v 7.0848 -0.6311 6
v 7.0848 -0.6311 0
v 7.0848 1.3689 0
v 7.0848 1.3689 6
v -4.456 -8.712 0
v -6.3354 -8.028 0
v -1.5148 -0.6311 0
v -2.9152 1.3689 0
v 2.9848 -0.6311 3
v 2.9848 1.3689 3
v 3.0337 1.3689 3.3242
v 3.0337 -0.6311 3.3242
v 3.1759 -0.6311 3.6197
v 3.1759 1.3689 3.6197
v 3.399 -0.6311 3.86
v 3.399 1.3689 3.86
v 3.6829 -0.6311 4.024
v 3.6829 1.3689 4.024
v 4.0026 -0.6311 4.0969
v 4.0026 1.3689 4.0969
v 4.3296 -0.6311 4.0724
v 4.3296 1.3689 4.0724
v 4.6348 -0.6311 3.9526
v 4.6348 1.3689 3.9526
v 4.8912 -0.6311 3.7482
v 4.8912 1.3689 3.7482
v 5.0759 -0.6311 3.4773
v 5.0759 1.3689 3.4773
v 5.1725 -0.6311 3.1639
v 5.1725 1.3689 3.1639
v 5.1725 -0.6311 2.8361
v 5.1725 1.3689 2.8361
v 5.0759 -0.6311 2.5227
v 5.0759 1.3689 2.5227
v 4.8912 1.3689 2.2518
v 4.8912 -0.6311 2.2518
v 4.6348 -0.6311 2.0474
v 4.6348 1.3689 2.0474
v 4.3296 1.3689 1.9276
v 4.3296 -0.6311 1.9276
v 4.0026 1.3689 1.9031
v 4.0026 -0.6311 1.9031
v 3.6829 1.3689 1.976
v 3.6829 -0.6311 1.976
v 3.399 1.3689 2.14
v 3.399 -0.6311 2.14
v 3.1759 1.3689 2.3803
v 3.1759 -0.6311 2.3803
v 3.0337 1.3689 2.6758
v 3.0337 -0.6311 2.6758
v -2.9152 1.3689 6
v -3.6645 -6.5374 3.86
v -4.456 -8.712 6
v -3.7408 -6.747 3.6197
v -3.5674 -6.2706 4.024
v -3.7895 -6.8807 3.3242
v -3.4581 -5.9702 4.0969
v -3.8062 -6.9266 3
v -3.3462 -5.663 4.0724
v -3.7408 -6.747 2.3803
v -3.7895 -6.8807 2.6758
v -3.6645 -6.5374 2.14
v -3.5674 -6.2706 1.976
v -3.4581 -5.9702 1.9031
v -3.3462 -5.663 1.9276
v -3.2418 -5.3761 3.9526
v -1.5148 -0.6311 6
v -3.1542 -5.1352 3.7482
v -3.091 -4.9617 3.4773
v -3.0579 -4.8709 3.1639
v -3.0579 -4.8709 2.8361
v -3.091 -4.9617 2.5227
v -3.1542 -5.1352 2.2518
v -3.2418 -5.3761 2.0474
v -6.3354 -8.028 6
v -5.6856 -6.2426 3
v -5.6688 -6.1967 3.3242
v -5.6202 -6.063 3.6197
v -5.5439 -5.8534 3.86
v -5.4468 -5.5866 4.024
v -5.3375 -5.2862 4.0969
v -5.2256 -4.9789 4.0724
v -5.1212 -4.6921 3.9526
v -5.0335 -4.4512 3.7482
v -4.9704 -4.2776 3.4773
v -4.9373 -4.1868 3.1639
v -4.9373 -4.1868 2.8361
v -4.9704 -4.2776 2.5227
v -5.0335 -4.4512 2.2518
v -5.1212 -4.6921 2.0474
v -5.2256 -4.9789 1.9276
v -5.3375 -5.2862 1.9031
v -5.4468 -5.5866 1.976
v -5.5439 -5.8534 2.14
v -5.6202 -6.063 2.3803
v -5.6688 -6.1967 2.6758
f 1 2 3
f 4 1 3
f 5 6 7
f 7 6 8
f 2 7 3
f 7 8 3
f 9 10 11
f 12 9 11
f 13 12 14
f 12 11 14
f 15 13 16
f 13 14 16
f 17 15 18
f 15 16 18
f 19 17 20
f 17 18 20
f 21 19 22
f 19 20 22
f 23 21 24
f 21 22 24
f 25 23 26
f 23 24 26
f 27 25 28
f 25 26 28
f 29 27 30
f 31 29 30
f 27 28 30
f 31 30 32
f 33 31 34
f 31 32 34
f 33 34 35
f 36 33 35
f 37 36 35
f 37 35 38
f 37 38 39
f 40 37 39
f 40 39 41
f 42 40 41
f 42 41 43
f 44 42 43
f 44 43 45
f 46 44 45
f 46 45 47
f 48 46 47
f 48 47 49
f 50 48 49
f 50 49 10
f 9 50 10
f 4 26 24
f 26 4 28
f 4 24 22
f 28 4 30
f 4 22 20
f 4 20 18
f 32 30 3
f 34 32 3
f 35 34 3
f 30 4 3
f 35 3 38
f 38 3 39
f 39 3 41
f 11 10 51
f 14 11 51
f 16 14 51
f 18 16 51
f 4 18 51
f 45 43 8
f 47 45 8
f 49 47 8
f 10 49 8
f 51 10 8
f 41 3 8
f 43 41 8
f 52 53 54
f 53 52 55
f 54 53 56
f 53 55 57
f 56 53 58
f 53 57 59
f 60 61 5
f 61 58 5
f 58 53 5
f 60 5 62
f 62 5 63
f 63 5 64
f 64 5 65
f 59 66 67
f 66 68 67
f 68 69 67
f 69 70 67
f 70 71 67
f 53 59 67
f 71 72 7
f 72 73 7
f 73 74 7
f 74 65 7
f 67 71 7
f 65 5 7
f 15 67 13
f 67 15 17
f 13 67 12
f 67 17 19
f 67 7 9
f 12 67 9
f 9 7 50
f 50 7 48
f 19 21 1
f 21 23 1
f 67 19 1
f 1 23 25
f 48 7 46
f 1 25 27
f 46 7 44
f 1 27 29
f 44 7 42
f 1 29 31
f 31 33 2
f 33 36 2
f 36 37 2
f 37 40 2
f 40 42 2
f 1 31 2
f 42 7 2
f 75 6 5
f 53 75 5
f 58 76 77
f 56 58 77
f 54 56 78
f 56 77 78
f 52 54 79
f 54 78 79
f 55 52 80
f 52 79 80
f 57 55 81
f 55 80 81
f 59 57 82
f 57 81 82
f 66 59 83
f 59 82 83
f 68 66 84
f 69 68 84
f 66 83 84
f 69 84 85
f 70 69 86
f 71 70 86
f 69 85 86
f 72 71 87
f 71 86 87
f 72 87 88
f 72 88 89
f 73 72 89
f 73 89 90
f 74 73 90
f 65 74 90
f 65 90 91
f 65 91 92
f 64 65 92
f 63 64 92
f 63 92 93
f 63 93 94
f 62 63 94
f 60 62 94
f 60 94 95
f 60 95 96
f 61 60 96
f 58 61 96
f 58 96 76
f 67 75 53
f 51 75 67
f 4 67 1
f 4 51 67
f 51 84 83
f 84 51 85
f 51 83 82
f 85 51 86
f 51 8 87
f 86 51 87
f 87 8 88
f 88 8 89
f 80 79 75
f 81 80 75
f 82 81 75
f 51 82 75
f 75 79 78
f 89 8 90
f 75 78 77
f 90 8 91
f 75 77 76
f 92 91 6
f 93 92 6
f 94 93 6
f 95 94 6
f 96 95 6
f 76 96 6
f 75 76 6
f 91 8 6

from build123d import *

# Parameters (mm, degrees)
BOSS_EXTRUDE1_DEPTH = 6
SKETCH2_R           = 1.1
CUT_EXTRUDE1_DEPTH  = 6
SKETCH3_R           = 1.1
CUT_EXTRUDE2_DEPTH  = 6


with BuildPart() as part:
    # Sketch1 → Boss-Extrude1 (new body)
    with BuildSketch(Plane.XY):
        Polygon((7.084804736, 1.368917583), (-2.915195264, 1.368917583), (-6.335396697, -8.028008625), (-4.456011456, -8.712048911), (-1.514780188, -0.631082417), (7.084804736, -0.631082417), align=None)
    extrude(amount=BOSS_EXTRUDE1_DEPTH)

    # Sketch2 → Cut-Extrude1 (cut)
    with BuildSketch(Plane(origin=(0, 1.368917583, 0), x_dir=(1, 0, 0), z_dir=(0, 1, 0))):
        with Locations(Location((4.084804736, -3, 0), (0, 0, 180))):
            Circle(SKETCH2_R)
    extrude(amount=-CUT_EXTRUDE1_DEPTH, mode=Mode.SUBTRACT)

    # Sketch3 → Cut-Extrude2 (cut)
    with BuildSketch(Plane(origin=(-3.014143829, 1.097058636, 0), x_dir=(0, 0, 1), z_dir=(-0.9396926207859095, 0.34202014332566544, 0))):
        with Locations(Location((3, -6.710693751, 0), (0, 0, 270))):
            Circle(SKETCH3_R)
    extrude(amount=-CUT_EXTRUDE2_DEPTH, mode=Mode.SUBTRACT)


solid = part.part
